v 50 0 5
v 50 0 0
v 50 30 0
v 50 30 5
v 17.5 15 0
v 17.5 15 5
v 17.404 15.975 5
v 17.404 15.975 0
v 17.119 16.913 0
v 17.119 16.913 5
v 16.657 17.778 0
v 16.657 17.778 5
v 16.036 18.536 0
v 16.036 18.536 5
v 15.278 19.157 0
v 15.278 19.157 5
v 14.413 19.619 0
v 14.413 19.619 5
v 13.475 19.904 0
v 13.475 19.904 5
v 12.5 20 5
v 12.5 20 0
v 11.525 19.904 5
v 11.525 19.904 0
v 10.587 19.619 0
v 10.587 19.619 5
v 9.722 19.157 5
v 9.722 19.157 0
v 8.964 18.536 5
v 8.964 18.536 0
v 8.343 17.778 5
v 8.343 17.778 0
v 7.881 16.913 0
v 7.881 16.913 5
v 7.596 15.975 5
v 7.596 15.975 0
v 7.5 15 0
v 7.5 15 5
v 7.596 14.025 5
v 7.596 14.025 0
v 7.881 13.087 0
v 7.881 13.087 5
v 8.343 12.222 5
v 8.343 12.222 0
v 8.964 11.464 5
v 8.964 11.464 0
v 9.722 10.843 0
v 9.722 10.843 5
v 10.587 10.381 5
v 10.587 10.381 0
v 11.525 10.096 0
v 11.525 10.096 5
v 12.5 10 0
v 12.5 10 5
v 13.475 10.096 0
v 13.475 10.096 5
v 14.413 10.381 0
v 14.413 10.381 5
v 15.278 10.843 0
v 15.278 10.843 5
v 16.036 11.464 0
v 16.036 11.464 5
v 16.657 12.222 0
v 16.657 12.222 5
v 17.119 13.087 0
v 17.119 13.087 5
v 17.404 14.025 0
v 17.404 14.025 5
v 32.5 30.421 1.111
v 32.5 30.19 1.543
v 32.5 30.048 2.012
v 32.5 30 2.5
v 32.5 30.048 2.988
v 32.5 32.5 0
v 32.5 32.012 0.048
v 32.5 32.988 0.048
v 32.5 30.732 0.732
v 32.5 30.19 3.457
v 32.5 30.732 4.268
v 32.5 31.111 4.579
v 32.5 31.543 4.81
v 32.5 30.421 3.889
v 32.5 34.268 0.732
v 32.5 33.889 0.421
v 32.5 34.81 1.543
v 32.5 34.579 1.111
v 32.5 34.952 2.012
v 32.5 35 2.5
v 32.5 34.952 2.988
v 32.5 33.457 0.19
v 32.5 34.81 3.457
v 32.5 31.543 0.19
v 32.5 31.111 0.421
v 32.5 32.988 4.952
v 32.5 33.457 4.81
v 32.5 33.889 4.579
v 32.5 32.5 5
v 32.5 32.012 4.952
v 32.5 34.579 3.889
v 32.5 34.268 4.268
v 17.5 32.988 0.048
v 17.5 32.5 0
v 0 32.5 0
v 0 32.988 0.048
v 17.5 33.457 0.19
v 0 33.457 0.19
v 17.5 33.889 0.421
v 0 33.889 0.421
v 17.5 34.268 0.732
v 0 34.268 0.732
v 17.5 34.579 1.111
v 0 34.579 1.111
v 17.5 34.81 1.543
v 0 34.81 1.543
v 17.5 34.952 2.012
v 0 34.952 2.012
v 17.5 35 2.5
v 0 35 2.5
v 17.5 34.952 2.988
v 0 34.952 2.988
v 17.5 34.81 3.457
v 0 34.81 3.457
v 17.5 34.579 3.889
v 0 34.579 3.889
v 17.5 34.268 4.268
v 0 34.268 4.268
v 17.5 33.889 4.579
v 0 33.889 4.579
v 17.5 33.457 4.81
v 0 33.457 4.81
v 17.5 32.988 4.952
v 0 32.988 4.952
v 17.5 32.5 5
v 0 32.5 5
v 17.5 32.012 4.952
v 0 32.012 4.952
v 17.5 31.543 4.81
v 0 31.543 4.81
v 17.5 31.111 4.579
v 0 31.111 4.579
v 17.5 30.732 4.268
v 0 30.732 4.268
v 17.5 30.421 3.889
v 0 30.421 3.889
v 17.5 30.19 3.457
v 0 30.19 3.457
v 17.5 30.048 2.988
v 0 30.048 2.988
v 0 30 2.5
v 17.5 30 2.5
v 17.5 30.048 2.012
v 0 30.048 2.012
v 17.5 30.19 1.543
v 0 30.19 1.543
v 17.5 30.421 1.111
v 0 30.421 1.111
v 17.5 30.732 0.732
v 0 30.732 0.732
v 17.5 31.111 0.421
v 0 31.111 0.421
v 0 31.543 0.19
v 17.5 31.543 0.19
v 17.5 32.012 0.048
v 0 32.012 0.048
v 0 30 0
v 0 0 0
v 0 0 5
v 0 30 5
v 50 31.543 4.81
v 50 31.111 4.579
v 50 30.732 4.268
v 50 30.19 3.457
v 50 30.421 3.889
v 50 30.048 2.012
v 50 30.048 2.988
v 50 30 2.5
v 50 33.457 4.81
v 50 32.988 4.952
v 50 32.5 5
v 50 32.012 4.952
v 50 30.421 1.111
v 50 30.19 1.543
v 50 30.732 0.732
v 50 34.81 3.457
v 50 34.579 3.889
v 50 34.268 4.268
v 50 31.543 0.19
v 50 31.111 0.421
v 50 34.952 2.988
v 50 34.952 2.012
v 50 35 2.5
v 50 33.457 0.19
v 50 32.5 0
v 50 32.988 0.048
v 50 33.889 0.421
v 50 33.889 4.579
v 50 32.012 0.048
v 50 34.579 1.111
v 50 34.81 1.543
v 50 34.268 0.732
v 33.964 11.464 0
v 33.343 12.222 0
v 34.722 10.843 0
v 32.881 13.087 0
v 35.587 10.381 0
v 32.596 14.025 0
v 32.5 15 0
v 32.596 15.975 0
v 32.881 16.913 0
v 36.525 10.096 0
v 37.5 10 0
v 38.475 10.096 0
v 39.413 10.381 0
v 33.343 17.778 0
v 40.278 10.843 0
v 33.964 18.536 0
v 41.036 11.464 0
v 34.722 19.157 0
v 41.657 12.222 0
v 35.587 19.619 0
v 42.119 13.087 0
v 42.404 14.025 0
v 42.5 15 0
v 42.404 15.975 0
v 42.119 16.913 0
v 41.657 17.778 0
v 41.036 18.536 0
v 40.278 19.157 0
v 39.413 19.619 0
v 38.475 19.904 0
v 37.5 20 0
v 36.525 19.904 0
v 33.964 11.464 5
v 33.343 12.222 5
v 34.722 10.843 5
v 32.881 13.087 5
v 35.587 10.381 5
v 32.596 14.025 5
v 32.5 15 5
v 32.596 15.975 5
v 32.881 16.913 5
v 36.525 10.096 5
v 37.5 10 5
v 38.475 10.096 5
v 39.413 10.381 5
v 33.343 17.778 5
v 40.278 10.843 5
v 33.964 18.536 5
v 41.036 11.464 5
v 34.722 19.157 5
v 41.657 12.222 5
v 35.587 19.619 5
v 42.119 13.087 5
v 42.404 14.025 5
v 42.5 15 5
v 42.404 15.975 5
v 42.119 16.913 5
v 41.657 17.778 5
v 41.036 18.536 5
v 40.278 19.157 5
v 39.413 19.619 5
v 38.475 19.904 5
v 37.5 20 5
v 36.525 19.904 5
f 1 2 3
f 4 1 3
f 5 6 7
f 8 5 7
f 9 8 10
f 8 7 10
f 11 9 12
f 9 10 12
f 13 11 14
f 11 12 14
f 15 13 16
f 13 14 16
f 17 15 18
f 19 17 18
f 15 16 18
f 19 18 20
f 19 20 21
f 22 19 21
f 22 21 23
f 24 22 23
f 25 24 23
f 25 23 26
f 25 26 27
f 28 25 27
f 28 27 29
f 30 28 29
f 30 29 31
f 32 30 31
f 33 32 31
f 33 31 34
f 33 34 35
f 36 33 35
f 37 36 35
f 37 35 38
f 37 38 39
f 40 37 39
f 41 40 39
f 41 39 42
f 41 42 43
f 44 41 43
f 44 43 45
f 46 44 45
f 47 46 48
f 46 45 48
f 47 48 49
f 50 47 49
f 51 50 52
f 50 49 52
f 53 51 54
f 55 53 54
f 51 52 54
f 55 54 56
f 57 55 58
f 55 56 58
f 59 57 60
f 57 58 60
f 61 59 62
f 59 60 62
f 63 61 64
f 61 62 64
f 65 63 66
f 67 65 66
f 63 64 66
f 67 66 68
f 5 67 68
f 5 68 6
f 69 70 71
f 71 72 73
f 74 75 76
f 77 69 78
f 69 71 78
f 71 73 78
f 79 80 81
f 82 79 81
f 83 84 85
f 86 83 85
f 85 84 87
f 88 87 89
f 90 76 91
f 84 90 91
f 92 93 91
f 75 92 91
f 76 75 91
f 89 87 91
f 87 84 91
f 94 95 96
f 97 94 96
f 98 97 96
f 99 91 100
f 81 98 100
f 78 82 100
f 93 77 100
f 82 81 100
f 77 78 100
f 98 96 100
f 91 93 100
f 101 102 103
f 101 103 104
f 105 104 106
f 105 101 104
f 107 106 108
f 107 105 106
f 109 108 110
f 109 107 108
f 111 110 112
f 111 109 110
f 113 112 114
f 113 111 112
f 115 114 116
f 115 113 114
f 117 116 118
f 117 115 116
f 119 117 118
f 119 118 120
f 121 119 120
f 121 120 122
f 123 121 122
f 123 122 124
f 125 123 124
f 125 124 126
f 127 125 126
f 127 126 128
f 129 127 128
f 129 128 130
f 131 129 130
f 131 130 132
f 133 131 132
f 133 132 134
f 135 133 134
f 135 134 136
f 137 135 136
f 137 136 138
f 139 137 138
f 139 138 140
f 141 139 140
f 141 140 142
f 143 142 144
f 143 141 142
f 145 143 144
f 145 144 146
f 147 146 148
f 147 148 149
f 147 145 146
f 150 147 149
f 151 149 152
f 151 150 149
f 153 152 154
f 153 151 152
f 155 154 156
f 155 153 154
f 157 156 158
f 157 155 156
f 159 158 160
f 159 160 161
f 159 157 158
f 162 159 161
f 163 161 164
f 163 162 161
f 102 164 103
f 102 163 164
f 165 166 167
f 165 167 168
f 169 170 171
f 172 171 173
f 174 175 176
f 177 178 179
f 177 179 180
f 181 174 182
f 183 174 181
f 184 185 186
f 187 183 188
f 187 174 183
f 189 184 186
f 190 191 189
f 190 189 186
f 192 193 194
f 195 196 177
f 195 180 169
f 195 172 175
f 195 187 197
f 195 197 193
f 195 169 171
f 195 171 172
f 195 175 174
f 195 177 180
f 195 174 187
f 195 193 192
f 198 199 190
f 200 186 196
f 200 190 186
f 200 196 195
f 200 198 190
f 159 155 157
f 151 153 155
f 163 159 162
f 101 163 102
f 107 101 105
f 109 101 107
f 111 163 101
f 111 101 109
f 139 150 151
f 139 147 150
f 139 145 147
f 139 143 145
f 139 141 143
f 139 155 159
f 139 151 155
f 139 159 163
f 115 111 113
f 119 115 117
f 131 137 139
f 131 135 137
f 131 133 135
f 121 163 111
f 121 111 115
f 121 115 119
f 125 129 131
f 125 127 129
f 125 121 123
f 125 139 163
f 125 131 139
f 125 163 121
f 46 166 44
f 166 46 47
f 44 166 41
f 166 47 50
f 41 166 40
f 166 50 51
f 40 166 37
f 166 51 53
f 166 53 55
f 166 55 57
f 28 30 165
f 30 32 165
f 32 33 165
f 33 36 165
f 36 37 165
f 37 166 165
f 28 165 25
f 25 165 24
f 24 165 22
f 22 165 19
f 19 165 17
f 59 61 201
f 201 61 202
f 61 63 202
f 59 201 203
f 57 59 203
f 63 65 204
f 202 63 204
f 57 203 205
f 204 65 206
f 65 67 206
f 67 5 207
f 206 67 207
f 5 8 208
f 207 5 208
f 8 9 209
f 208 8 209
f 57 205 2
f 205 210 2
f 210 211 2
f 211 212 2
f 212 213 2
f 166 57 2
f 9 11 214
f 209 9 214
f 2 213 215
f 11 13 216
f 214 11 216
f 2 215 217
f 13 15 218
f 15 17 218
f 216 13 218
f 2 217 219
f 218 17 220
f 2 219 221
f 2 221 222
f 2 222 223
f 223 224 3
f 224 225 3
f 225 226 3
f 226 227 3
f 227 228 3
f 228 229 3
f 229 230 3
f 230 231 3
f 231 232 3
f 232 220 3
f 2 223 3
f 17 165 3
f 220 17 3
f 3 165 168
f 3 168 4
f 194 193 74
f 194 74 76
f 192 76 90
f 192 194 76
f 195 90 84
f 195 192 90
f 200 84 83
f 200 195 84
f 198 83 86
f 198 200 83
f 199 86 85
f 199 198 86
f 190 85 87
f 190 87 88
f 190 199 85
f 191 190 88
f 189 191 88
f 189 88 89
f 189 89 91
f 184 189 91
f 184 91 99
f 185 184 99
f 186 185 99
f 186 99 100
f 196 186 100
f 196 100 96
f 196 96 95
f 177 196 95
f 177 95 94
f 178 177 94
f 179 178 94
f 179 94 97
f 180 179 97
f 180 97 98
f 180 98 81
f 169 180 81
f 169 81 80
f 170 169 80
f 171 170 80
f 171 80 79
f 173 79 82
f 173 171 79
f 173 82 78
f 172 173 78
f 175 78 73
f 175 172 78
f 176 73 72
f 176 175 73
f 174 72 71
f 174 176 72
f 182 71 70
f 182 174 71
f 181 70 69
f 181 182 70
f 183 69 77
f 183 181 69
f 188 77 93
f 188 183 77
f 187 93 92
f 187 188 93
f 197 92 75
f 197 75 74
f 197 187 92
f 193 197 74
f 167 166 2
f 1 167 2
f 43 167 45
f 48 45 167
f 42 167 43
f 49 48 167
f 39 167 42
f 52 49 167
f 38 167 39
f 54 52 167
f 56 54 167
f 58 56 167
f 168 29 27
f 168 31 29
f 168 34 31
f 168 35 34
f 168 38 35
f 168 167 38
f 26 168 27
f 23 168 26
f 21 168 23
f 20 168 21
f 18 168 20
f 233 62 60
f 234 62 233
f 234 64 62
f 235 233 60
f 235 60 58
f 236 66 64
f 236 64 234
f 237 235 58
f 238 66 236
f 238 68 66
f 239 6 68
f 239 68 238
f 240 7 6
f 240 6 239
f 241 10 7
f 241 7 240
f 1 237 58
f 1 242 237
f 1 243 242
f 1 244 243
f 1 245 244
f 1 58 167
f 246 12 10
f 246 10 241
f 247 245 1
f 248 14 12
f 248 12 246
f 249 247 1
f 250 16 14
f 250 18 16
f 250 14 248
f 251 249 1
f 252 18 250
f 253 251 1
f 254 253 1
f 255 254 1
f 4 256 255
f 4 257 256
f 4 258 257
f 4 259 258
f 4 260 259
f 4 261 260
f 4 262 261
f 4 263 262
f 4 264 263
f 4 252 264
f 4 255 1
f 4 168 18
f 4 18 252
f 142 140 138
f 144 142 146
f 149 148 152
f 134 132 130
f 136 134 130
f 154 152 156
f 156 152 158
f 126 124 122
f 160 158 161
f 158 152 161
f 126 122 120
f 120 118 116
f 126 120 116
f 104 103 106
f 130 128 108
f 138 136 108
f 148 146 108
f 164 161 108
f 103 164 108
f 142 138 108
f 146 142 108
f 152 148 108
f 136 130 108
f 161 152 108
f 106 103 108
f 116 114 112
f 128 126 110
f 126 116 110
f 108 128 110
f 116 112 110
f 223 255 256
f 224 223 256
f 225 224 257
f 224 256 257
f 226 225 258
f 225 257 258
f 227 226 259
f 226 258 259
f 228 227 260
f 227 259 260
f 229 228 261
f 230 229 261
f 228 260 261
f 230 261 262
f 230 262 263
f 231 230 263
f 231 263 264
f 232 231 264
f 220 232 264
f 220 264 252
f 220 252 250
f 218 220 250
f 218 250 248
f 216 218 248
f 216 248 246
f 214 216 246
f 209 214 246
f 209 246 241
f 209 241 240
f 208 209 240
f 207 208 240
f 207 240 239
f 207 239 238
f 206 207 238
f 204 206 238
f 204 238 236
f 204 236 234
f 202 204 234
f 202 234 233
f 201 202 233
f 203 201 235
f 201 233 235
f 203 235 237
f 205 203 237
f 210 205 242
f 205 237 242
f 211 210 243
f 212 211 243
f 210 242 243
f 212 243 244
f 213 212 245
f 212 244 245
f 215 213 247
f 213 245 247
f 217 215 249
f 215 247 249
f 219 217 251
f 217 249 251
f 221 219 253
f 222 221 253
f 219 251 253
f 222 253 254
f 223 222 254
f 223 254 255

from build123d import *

# Parameters (mm, degrees)
ESQUISSE1_W                  = 50
ESQUISSE1_H                  = 30
BOSS_EXTRU_1_DEPTH           = 5
ESQUISSE2_R                  = 5
ENL_V_MAT_EXTRU_1_DEPTH      = 59.523499554
ESQUISSE3_R                  = 2.5
BOSS_EXTRU_2_DEPTH           = 50
ENL_V_MAT_EXTRU_4_DEPTH      = 50
ENL_V_MAT_EXTRU_4_DEPTH_BACK = 50
ESQUISSE4_W                  = 15
ESQUISSE4_H                  = 5


with BuildPart() as part:
    # Esquisse1 → Boss.-Extru.1 (new body)
    with BuildSketch(Plane.XY):
        with Locations((25, 15)):
            Rectangle(ESQUISSE1_W, ESQUISSE1_H)
    extrude(amount=BOSS_EXTRU_1_DEPTH)

    # Esquisse2 → Enlèv. mat.-Extru.1 (cut, through all)
    with BuildSketch(Plane.XY.offset(5)):
        with Locations((12.5, 15)):
            Circle(ESQUISSE2_R)
        with Locations((37.5, 15)):
            Circle(ESQUISSE2_R)
    extrude(amount=-ENL_V_MAT_EXTRU_1_DEPTH, mode=Mode.SUBTRACT)


with BuildPart() as body_2:
    # Esquisse3 → Boss.-Extru.2 (new body)
    with BuildSketch(Plane(origin=(50, 0, 0), x_dir=(0, 0, -1), z_dir=(1, 0, 0))):
        with Locations((-2.5, 32.5)):
            Circle(ESQUISSE3_R)
    extrude(amount=-BOSS_EXTRU_2_DEPTH)

    # Esquisse4 → Enlèv. mat.-Extru.4 (cut, two sides: drawn at the far end of the back side and taken through both)
    with BuildSketch(Plane.XY.offset(5).offset(-ENL_V_MAT_EXTRU_4_DEPTH_BACK)):
        with Locations((25, 32.5)):
            Rectangle(ESQUISSE4_W, ESQUISSE4_H)
    extrude(amount=ENL_V_MAT_EXTRU_4_DEPTH + ENL_V_MAT_EXTRU_4_DEPTH_BACK, mode=Mode.SUBTRACT)


with BuildPart() as enl_v_mat_extru_4_piece_1:
    # of the separate pieces the step leaves, piece 1, a body of its own (enl_v_mat_extru_4_pieces)
    add(body_2.part.solids().sort_by_distance((17.5, 32.5, 0))[0])


with BuildPart() as enl_v_mat_extru_4_piece_2:
    # of the separate pieces the step leaves, piece 2, a body of its own (enl_v_mat_extru_4_pieces)
    add(body_2.part.solids().sort_by_distance((50, 32.5, 0))[0])


solid = Compound([part.part, enl_v_mat_extru_4_piece_1.part, enl_v_mat_extru_4_piece_2.part])
